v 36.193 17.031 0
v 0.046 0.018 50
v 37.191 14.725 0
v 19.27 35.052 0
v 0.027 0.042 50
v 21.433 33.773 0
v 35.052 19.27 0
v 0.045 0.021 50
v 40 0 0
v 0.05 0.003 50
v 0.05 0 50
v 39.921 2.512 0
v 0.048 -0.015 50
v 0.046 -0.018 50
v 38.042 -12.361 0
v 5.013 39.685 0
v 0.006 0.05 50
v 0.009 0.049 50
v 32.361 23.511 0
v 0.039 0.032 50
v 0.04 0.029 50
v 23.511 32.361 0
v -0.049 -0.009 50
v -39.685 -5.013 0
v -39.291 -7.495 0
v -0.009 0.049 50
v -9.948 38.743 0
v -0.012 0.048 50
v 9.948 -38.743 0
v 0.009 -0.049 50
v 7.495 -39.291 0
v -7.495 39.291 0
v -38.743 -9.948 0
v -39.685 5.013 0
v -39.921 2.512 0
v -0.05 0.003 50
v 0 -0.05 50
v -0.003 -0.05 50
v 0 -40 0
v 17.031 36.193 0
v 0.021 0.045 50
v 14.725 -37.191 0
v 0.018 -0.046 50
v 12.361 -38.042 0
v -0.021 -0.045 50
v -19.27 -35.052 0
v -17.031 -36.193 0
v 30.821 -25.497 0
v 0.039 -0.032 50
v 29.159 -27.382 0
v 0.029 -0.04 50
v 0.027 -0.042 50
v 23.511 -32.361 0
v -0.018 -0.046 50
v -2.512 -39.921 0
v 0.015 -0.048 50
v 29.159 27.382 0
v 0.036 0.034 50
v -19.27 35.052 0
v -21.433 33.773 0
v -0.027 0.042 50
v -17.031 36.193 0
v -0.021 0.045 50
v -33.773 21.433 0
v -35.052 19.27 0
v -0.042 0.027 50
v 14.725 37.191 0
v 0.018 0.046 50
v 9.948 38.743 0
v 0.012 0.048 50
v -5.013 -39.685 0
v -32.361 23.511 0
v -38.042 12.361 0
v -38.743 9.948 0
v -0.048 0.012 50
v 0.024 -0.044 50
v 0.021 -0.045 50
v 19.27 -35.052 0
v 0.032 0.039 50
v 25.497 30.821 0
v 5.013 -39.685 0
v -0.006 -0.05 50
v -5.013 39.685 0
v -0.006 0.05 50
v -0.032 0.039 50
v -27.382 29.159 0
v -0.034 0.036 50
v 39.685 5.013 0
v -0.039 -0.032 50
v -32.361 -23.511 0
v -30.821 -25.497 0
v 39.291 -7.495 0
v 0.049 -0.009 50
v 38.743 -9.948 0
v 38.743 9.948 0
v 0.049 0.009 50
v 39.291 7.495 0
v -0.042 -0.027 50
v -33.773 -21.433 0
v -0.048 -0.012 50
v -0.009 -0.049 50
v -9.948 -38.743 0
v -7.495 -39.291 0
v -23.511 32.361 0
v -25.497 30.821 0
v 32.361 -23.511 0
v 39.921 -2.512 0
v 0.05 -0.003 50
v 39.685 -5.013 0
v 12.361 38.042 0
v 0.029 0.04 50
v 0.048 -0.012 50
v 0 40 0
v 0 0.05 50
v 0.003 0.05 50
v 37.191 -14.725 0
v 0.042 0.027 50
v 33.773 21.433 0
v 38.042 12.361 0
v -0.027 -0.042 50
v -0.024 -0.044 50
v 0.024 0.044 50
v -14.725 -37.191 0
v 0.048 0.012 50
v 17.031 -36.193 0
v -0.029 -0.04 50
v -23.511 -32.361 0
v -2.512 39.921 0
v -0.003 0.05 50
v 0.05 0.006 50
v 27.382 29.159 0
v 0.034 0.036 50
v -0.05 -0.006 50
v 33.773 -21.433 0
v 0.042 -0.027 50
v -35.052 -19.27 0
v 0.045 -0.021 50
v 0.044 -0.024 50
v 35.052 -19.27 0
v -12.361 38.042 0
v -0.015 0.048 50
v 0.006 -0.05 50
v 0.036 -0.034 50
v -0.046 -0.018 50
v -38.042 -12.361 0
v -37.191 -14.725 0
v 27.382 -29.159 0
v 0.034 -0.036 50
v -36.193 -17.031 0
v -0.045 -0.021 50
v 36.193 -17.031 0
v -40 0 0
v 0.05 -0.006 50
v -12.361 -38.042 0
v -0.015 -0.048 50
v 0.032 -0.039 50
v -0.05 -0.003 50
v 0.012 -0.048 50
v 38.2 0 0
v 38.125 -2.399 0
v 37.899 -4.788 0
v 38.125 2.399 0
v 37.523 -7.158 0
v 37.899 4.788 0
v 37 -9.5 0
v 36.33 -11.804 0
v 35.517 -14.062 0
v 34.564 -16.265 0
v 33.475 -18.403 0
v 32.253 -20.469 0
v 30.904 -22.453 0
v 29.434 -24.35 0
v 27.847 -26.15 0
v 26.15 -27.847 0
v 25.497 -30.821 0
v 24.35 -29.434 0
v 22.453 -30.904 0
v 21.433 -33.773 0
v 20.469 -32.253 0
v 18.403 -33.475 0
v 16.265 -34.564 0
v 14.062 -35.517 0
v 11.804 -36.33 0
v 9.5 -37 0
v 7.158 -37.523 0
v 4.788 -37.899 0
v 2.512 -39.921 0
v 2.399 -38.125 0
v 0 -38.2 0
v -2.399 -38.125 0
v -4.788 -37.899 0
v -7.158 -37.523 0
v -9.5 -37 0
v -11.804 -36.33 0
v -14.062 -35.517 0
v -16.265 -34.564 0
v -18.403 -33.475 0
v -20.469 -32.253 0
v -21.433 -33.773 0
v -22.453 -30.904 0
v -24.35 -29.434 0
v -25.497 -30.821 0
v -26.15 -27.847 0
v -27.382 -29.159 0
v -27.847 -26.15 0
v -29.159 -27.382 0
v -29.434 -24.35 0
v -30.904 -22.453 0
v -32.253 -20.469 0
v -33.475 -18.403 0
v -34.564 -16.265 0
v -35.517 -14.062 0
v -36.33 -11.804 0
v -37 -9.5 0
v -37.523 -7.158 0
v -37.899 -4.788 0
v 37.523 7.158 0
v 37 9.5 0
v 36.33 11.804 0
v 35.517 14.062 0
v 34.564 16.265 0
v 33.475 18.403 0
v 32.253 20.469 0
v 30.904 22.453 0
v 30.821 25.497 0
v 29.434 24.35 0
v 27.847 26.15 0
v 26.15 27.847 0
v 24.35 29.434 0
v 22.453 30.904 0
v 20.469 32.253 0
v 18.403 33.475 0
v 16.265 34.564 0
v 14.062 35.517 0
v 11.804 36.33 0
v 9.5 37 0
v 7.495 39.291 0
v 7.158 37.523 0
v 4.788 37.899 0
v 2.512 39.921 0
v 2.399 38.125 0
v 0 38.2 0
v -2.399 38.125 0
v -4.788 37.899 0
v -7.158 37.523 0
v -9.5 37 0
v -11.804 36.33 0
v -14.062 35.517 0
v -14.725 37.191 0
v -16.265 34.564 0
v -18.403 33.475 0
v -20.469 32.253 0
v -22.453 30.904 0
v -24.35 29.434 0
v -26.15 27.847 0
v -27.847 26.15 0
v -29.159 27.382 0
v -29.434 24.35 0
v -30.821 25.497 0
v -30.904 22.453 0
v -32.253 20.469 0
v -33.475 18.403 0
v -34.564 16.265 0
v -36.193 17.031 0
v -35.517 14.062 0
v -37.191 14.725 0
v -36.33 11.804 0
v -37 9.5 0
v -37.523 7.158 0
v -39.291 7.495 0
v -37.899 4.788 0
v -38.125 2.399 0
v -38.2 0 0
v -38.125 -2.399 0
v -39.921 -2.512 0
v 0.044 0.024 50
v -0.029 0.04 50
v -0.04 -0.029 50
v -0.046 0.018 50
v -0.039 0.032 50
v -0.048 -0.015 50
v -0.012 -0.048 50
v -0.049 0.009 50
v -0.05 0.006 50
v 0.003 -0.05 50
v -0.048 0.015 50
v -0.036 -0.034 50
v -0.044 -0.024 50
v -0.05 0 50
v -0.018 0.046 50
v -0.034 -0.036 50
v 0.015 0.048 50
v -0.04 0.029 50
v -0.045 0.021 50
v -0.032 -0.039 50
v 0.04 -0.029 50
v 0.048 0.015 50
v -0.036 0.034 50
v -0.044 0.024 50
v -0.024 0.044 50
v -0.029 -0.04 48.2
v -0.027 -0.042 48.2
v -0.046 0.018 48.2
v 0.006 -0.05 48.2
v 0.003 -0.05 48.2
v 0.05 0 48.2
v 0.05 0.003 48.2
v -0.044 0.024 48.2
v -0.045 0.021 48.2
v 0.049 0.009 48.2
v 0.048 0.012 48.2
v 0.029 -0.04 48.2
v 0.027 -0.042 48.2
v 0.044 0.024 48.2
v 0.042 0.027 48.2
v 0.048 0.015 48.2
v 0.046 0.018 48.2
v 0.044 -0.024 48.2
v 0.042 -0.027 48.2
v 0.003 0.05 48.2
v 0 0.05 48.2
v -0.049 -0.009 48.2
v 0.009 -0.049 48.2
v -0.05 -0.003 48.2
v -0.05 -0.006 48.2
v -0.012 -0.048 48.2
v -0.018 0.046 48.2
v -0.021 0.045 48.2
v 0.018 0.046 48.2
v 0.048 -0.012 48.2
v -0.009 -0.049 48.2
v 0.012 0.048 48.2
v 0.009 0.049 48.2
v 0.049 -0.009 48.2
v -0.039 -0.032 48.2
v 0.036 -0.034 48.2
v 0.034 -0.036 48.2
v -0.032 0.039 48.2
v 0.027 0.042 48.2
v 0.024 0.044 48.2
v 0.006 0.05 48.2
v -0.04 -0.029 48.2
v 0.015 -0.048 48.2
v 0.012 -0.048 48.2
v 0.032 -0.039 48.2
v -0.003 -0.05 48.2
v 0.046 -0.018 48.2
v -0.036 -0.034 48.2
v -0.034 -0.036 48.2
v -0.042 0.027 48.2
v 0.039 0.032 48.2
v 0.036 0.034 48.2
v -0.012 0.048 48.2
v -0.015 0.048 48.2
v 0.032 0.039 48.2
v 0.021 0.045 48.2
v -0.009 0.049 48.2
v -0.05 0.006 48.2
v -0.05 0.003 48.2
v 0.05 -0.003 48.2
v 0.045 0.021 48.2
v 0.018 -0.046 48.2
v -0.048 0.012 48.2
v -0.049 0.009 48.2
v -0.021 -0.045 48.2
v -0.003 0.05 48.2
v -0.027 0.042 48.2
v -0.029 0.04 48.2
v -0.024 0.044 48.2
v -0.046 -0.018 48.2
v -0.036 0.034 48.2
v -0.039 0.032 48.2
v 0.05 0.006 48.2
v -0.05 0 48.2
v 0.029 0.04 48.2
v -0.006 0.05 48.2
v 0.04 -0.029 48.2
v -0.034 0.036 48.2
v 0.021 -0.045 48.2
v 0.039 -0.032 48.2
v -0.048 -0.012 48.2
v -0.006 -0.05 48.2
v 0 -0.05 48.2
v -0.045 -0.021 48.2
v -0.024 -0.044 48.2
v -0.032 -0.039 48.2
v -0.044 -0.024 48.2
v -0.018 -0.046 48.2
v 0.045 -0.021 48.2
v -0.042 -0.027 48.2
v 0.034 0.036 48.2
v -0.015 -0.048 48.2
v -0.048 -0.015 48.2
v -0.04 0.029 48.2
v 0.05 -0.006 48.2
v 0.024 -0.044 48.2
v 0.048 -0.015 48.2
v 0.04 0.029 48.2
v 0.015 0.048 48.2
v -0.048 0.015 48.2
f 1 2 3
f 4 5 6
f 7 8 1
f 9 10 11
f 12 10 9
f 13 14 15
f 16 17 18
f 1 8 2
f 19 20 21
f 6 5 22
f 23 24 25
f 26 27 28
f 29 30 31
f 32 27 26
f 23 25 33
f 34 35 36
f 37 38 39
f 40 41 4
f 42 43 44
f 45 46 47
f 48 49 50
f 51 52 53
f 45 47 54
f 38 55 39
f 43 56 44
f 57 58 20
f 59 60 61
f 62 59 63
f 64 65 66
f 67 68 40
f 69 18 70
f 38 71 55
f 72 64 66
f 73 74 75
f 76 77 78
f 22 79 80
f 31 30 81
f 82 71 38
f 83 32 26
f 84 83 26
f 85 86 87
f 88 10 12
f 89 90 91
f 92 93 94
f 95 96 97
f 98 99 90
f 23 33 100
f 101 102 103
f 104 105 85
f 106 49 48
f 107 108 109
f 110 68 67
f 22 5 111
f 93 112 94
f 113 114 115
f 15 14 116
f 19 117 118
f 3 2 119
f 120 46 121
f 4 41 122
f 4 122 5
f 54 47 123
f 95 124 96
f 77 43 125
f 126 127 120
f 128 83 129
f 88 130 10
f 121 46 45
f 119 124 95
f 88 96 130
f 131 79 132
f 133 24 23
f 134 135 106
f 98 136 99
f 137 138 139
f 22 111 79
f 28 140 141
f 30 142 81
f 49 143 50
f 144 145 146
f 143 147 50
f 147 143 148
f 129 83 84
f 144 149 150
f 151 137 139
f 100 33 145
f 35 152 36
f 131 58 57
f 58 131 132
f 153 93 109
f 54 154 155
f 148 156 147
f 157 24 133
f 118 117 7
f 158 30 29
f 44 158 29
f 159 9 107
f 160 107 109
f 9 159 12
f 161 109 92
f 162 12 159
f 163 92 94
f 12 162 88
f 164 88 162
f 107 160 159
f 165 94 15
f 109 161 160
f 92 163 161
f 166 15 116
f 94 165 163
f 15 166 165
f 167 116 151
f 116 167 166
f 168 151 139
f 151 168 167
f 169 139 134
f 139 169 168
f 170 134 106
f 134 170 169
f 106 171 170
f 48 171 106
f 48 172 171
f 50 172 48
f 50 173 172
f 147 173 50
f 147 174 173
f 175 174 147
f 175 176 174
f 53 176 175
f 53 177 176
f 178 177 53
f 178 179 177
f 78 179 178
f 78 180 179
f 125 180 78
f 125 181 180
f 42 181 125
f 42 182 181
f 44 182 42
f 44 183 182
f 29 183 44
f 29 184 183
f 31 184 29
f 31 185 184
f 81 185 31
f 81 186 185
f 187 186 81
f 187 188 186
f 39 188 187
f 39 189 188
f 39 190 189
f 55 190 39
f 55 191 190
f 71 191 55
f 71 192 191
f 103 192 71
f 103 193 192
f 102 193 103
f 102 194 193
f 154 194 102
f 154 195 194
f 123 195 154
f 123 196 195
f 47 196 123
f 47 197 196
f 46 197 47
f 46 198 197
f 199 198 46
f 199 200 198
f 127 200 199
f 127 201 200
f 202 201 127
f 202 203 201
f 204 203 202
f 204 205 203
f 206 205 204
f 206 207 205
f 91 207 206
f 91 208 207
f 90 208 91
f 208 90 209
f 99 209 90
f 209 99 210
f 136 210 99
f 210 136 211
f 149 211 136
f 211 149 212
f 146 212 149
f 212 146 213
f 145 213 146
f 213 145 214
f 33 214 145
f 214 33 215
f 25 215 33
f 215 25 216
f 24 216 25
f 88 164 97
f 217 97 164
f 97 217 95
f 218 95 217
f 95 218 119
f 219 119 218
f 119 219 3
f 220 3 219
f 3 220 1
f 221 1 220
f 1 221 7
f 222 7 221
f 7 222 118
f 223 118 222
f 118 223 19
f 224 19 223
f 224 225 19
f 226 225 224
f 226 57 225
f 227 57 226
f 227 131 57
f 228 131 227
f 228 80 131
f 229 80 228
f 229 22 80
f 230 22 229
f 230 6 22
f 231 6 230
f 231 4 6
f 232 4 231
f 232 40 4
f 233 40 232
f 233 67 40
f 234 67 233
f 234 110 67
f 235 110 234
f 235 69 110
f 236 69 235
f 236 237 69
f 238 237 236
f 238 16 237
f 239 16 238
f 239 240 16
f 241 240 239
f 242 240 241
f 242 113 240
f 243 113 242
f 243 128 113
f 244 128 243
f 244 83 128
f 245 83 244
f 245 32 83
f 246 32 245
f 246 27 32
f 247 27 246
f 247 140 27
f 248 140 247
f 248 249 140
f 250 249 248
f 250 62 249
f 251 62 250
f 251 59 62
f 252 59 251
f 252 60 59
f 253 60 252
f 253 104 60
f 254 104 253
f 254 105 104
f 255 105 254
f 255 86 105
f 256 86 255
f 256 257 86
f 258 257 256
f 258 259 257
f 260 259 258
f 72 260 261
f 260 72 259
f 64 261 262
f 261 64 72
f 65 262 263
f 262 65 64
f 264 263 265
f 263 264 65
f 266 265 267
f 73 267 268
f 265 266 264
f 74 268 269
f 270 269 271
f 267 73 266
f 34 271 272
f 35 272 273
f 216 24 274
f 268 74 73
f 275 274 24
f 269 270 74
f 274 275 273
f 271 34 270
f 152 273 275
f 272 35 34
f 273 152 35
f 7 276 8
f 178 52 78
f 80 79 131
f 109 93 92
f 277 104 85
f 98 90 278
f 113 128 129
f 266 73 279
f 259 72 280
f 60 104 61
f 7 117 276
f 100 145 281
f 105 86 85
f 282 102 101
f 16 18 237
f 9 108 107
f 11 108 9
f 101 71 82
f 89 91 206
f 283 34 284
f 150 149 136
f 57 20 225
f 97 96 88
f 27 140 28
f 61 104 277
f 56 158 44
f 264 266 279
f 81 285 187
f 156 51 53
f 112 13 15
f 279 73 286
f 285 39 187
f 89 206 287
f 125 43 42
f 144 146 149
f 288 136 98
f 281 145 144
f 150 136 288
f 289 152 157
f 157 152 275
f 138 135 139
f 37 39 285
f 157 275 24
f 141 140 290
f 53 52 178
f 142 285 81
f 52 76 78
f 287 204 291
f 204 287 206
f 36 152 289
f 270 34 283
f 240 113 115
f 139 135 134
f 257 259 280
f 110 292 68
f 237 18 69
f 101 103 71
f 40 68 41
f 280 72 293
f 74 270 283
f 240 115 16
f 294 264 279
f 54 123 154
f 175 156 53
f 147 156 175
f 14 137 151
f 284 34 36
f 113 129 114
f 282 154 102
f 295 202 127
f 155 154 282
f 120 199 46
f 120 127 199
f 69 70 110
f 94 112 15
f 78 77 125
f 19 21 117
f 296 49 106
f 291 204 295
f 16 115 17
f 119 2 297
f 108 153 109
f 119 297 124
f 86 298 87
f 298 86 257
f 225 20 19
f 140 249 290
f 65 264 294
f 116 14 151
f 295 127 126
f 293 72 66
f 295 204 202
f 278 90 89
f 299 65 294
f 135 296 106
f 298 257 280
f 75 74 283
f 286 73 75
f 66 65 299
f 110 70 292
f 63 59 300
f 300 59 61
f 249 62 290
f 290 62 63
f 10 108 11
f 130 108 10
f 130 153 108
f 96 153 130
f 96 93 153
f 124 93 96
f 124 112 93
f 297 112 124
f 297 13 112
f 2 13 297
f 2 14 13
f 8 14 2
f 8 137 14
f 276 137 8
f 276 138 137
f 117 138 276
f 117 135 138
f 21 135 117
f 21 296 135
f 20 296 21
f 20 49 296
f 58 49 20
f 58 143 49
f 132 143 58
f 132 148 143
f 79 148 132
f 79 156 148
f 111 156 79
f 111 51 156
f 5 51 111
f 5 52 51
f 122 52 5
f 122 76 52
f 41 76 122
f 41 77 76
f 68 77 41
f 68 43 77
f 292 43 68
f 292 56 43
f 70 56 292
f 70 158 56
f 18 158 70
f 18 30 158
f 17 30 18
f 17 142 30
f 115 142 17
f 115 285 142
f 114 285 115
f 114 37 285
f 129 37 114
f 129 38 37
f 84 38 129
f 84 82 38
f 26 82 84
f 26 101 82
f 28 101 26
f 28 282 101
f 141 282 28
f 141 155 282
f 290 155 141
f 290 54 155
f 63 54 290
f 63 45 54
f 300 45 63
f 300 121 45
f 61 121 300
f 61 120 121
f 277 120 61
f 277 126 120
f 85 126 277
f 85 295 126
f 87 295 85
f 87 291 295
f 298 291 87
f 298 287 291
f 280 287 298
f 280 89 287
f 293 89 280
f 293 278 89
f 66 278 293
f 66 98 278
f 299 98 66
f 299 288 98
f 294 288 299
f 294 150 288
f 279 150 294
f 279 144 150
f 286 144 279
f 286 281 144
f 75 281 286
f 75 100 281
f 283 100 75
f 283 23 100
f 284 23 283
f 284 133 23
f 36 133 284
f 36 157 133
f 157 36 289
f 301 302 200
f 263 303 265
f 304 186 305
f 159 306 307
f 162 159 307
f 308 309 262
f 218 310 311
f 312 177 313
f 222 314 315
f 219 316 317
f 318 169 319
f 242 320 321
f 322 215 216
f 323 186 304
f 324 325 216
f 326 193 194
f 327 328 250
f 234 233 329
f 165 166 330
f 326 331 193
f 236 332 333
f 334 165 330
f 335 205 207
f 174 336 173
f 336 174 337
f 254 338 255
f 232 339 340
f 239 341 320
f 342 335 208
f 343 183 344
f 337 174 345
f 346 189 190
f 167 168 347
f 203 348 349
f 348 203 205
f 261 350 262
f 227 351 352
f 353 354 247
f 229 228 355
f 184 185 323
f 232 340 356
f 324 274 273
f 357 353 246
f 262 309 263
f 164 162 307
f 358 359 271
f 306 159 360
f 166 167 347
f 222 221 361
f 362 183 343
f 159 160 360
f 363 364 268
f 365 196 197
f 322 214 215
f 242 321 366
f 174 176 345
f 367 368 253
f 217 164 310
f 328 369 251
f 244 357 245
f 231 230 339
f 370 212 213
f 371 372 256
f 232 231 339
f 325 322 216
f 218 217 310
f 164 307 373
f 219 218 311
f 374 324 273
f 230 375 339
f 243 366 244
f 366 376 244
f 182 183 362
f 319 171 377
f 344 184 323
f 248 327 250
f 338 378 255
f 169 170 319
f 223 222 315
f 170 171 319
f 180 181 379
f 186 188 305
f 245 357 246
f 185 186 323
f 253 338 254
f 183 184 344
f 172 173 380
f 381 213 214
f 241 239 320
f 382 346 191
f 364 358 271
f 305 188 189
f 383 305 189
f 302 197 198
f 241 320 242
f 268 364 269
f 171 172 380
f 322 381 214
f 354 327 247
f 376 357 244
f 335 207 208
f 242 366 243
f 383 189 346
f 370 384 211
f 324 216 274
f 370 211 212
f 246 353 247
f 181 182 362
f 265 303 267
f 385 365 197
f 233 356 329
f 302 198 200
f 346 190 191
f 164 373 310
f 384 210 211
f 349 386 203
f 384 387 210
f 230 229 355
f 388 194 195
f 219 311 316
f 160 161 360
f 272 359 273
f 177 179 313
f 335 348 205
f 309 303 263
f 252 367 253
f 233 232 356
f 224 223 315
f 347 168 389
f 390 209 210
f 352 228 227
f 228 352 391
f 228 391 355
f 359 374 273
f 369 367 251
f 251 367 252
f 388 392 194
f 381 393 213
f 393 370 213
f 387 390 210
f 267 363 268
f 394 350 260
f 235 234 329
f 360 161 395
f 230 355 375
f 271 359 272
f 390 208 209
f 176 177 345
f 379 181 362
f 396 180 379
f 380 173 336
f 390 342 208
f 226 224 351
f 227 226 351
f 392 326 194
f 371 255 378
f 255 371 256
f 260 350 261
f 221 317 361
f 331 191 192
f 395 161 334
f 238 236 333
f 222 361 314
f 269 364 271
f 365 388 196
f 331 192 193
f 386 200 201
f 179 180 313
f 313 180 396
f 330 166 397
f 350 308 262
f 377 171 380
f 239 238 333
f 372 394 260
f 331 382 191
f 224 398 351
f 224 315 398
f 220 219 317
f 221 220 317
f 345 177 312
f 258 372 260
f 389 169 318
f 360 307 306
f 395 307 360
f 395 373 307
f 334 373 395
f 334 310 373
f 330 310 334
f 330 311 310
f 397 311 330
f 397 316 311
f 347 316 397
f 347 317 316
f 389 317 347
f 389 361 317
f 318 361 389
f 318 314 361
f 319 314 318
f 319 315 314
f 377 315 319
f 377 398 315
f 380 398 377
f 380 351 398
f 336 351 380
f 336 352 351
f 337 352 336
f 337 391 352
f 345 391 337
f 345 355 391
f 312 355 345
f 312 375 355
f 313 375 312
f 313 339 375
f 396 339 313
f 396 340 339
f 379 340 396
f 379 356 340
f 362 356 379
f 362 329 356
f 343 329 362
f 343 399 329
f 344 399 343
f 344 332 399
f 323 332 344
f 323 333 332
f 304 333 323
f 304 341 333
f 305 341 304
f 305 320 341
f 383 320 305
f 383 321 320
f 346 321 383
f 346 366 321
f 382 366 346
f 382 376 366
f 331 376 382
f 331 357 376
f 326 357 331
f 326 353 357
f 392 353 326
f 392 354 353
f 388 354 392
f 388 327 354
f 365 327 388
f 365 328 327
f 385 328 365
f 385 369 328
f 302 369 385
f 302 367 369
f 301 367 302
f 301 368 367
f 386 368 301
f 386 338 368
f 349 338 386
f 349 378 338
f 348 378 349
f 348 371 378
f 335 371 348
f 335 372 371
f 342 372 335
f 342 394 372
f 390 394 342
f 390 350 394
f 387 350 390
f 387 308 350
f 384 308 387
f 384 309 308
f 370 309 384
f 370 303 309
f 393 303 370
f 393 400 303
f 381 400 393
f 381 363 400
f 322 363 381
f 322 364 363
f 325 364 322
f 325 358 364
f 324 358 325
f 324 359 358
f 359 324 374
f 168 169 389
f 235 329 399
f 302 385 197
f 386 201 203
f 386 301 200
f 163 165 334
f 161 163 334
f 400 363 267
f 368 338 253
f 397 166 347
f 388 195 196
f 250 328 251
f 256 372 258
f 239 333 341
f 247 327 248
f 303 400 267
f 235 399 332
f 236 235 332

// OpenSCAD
module cone()
{
  wall = 3*0.6; // i.e. 3x extrusion width
  difference()
  {
    cylinder(d1=80, d2=0.1, h=50, $fn=100);
    cylinder(d1=80-2*wall, d2=0.1, h=50-wall, $fn=100);
  }
}

cone();
